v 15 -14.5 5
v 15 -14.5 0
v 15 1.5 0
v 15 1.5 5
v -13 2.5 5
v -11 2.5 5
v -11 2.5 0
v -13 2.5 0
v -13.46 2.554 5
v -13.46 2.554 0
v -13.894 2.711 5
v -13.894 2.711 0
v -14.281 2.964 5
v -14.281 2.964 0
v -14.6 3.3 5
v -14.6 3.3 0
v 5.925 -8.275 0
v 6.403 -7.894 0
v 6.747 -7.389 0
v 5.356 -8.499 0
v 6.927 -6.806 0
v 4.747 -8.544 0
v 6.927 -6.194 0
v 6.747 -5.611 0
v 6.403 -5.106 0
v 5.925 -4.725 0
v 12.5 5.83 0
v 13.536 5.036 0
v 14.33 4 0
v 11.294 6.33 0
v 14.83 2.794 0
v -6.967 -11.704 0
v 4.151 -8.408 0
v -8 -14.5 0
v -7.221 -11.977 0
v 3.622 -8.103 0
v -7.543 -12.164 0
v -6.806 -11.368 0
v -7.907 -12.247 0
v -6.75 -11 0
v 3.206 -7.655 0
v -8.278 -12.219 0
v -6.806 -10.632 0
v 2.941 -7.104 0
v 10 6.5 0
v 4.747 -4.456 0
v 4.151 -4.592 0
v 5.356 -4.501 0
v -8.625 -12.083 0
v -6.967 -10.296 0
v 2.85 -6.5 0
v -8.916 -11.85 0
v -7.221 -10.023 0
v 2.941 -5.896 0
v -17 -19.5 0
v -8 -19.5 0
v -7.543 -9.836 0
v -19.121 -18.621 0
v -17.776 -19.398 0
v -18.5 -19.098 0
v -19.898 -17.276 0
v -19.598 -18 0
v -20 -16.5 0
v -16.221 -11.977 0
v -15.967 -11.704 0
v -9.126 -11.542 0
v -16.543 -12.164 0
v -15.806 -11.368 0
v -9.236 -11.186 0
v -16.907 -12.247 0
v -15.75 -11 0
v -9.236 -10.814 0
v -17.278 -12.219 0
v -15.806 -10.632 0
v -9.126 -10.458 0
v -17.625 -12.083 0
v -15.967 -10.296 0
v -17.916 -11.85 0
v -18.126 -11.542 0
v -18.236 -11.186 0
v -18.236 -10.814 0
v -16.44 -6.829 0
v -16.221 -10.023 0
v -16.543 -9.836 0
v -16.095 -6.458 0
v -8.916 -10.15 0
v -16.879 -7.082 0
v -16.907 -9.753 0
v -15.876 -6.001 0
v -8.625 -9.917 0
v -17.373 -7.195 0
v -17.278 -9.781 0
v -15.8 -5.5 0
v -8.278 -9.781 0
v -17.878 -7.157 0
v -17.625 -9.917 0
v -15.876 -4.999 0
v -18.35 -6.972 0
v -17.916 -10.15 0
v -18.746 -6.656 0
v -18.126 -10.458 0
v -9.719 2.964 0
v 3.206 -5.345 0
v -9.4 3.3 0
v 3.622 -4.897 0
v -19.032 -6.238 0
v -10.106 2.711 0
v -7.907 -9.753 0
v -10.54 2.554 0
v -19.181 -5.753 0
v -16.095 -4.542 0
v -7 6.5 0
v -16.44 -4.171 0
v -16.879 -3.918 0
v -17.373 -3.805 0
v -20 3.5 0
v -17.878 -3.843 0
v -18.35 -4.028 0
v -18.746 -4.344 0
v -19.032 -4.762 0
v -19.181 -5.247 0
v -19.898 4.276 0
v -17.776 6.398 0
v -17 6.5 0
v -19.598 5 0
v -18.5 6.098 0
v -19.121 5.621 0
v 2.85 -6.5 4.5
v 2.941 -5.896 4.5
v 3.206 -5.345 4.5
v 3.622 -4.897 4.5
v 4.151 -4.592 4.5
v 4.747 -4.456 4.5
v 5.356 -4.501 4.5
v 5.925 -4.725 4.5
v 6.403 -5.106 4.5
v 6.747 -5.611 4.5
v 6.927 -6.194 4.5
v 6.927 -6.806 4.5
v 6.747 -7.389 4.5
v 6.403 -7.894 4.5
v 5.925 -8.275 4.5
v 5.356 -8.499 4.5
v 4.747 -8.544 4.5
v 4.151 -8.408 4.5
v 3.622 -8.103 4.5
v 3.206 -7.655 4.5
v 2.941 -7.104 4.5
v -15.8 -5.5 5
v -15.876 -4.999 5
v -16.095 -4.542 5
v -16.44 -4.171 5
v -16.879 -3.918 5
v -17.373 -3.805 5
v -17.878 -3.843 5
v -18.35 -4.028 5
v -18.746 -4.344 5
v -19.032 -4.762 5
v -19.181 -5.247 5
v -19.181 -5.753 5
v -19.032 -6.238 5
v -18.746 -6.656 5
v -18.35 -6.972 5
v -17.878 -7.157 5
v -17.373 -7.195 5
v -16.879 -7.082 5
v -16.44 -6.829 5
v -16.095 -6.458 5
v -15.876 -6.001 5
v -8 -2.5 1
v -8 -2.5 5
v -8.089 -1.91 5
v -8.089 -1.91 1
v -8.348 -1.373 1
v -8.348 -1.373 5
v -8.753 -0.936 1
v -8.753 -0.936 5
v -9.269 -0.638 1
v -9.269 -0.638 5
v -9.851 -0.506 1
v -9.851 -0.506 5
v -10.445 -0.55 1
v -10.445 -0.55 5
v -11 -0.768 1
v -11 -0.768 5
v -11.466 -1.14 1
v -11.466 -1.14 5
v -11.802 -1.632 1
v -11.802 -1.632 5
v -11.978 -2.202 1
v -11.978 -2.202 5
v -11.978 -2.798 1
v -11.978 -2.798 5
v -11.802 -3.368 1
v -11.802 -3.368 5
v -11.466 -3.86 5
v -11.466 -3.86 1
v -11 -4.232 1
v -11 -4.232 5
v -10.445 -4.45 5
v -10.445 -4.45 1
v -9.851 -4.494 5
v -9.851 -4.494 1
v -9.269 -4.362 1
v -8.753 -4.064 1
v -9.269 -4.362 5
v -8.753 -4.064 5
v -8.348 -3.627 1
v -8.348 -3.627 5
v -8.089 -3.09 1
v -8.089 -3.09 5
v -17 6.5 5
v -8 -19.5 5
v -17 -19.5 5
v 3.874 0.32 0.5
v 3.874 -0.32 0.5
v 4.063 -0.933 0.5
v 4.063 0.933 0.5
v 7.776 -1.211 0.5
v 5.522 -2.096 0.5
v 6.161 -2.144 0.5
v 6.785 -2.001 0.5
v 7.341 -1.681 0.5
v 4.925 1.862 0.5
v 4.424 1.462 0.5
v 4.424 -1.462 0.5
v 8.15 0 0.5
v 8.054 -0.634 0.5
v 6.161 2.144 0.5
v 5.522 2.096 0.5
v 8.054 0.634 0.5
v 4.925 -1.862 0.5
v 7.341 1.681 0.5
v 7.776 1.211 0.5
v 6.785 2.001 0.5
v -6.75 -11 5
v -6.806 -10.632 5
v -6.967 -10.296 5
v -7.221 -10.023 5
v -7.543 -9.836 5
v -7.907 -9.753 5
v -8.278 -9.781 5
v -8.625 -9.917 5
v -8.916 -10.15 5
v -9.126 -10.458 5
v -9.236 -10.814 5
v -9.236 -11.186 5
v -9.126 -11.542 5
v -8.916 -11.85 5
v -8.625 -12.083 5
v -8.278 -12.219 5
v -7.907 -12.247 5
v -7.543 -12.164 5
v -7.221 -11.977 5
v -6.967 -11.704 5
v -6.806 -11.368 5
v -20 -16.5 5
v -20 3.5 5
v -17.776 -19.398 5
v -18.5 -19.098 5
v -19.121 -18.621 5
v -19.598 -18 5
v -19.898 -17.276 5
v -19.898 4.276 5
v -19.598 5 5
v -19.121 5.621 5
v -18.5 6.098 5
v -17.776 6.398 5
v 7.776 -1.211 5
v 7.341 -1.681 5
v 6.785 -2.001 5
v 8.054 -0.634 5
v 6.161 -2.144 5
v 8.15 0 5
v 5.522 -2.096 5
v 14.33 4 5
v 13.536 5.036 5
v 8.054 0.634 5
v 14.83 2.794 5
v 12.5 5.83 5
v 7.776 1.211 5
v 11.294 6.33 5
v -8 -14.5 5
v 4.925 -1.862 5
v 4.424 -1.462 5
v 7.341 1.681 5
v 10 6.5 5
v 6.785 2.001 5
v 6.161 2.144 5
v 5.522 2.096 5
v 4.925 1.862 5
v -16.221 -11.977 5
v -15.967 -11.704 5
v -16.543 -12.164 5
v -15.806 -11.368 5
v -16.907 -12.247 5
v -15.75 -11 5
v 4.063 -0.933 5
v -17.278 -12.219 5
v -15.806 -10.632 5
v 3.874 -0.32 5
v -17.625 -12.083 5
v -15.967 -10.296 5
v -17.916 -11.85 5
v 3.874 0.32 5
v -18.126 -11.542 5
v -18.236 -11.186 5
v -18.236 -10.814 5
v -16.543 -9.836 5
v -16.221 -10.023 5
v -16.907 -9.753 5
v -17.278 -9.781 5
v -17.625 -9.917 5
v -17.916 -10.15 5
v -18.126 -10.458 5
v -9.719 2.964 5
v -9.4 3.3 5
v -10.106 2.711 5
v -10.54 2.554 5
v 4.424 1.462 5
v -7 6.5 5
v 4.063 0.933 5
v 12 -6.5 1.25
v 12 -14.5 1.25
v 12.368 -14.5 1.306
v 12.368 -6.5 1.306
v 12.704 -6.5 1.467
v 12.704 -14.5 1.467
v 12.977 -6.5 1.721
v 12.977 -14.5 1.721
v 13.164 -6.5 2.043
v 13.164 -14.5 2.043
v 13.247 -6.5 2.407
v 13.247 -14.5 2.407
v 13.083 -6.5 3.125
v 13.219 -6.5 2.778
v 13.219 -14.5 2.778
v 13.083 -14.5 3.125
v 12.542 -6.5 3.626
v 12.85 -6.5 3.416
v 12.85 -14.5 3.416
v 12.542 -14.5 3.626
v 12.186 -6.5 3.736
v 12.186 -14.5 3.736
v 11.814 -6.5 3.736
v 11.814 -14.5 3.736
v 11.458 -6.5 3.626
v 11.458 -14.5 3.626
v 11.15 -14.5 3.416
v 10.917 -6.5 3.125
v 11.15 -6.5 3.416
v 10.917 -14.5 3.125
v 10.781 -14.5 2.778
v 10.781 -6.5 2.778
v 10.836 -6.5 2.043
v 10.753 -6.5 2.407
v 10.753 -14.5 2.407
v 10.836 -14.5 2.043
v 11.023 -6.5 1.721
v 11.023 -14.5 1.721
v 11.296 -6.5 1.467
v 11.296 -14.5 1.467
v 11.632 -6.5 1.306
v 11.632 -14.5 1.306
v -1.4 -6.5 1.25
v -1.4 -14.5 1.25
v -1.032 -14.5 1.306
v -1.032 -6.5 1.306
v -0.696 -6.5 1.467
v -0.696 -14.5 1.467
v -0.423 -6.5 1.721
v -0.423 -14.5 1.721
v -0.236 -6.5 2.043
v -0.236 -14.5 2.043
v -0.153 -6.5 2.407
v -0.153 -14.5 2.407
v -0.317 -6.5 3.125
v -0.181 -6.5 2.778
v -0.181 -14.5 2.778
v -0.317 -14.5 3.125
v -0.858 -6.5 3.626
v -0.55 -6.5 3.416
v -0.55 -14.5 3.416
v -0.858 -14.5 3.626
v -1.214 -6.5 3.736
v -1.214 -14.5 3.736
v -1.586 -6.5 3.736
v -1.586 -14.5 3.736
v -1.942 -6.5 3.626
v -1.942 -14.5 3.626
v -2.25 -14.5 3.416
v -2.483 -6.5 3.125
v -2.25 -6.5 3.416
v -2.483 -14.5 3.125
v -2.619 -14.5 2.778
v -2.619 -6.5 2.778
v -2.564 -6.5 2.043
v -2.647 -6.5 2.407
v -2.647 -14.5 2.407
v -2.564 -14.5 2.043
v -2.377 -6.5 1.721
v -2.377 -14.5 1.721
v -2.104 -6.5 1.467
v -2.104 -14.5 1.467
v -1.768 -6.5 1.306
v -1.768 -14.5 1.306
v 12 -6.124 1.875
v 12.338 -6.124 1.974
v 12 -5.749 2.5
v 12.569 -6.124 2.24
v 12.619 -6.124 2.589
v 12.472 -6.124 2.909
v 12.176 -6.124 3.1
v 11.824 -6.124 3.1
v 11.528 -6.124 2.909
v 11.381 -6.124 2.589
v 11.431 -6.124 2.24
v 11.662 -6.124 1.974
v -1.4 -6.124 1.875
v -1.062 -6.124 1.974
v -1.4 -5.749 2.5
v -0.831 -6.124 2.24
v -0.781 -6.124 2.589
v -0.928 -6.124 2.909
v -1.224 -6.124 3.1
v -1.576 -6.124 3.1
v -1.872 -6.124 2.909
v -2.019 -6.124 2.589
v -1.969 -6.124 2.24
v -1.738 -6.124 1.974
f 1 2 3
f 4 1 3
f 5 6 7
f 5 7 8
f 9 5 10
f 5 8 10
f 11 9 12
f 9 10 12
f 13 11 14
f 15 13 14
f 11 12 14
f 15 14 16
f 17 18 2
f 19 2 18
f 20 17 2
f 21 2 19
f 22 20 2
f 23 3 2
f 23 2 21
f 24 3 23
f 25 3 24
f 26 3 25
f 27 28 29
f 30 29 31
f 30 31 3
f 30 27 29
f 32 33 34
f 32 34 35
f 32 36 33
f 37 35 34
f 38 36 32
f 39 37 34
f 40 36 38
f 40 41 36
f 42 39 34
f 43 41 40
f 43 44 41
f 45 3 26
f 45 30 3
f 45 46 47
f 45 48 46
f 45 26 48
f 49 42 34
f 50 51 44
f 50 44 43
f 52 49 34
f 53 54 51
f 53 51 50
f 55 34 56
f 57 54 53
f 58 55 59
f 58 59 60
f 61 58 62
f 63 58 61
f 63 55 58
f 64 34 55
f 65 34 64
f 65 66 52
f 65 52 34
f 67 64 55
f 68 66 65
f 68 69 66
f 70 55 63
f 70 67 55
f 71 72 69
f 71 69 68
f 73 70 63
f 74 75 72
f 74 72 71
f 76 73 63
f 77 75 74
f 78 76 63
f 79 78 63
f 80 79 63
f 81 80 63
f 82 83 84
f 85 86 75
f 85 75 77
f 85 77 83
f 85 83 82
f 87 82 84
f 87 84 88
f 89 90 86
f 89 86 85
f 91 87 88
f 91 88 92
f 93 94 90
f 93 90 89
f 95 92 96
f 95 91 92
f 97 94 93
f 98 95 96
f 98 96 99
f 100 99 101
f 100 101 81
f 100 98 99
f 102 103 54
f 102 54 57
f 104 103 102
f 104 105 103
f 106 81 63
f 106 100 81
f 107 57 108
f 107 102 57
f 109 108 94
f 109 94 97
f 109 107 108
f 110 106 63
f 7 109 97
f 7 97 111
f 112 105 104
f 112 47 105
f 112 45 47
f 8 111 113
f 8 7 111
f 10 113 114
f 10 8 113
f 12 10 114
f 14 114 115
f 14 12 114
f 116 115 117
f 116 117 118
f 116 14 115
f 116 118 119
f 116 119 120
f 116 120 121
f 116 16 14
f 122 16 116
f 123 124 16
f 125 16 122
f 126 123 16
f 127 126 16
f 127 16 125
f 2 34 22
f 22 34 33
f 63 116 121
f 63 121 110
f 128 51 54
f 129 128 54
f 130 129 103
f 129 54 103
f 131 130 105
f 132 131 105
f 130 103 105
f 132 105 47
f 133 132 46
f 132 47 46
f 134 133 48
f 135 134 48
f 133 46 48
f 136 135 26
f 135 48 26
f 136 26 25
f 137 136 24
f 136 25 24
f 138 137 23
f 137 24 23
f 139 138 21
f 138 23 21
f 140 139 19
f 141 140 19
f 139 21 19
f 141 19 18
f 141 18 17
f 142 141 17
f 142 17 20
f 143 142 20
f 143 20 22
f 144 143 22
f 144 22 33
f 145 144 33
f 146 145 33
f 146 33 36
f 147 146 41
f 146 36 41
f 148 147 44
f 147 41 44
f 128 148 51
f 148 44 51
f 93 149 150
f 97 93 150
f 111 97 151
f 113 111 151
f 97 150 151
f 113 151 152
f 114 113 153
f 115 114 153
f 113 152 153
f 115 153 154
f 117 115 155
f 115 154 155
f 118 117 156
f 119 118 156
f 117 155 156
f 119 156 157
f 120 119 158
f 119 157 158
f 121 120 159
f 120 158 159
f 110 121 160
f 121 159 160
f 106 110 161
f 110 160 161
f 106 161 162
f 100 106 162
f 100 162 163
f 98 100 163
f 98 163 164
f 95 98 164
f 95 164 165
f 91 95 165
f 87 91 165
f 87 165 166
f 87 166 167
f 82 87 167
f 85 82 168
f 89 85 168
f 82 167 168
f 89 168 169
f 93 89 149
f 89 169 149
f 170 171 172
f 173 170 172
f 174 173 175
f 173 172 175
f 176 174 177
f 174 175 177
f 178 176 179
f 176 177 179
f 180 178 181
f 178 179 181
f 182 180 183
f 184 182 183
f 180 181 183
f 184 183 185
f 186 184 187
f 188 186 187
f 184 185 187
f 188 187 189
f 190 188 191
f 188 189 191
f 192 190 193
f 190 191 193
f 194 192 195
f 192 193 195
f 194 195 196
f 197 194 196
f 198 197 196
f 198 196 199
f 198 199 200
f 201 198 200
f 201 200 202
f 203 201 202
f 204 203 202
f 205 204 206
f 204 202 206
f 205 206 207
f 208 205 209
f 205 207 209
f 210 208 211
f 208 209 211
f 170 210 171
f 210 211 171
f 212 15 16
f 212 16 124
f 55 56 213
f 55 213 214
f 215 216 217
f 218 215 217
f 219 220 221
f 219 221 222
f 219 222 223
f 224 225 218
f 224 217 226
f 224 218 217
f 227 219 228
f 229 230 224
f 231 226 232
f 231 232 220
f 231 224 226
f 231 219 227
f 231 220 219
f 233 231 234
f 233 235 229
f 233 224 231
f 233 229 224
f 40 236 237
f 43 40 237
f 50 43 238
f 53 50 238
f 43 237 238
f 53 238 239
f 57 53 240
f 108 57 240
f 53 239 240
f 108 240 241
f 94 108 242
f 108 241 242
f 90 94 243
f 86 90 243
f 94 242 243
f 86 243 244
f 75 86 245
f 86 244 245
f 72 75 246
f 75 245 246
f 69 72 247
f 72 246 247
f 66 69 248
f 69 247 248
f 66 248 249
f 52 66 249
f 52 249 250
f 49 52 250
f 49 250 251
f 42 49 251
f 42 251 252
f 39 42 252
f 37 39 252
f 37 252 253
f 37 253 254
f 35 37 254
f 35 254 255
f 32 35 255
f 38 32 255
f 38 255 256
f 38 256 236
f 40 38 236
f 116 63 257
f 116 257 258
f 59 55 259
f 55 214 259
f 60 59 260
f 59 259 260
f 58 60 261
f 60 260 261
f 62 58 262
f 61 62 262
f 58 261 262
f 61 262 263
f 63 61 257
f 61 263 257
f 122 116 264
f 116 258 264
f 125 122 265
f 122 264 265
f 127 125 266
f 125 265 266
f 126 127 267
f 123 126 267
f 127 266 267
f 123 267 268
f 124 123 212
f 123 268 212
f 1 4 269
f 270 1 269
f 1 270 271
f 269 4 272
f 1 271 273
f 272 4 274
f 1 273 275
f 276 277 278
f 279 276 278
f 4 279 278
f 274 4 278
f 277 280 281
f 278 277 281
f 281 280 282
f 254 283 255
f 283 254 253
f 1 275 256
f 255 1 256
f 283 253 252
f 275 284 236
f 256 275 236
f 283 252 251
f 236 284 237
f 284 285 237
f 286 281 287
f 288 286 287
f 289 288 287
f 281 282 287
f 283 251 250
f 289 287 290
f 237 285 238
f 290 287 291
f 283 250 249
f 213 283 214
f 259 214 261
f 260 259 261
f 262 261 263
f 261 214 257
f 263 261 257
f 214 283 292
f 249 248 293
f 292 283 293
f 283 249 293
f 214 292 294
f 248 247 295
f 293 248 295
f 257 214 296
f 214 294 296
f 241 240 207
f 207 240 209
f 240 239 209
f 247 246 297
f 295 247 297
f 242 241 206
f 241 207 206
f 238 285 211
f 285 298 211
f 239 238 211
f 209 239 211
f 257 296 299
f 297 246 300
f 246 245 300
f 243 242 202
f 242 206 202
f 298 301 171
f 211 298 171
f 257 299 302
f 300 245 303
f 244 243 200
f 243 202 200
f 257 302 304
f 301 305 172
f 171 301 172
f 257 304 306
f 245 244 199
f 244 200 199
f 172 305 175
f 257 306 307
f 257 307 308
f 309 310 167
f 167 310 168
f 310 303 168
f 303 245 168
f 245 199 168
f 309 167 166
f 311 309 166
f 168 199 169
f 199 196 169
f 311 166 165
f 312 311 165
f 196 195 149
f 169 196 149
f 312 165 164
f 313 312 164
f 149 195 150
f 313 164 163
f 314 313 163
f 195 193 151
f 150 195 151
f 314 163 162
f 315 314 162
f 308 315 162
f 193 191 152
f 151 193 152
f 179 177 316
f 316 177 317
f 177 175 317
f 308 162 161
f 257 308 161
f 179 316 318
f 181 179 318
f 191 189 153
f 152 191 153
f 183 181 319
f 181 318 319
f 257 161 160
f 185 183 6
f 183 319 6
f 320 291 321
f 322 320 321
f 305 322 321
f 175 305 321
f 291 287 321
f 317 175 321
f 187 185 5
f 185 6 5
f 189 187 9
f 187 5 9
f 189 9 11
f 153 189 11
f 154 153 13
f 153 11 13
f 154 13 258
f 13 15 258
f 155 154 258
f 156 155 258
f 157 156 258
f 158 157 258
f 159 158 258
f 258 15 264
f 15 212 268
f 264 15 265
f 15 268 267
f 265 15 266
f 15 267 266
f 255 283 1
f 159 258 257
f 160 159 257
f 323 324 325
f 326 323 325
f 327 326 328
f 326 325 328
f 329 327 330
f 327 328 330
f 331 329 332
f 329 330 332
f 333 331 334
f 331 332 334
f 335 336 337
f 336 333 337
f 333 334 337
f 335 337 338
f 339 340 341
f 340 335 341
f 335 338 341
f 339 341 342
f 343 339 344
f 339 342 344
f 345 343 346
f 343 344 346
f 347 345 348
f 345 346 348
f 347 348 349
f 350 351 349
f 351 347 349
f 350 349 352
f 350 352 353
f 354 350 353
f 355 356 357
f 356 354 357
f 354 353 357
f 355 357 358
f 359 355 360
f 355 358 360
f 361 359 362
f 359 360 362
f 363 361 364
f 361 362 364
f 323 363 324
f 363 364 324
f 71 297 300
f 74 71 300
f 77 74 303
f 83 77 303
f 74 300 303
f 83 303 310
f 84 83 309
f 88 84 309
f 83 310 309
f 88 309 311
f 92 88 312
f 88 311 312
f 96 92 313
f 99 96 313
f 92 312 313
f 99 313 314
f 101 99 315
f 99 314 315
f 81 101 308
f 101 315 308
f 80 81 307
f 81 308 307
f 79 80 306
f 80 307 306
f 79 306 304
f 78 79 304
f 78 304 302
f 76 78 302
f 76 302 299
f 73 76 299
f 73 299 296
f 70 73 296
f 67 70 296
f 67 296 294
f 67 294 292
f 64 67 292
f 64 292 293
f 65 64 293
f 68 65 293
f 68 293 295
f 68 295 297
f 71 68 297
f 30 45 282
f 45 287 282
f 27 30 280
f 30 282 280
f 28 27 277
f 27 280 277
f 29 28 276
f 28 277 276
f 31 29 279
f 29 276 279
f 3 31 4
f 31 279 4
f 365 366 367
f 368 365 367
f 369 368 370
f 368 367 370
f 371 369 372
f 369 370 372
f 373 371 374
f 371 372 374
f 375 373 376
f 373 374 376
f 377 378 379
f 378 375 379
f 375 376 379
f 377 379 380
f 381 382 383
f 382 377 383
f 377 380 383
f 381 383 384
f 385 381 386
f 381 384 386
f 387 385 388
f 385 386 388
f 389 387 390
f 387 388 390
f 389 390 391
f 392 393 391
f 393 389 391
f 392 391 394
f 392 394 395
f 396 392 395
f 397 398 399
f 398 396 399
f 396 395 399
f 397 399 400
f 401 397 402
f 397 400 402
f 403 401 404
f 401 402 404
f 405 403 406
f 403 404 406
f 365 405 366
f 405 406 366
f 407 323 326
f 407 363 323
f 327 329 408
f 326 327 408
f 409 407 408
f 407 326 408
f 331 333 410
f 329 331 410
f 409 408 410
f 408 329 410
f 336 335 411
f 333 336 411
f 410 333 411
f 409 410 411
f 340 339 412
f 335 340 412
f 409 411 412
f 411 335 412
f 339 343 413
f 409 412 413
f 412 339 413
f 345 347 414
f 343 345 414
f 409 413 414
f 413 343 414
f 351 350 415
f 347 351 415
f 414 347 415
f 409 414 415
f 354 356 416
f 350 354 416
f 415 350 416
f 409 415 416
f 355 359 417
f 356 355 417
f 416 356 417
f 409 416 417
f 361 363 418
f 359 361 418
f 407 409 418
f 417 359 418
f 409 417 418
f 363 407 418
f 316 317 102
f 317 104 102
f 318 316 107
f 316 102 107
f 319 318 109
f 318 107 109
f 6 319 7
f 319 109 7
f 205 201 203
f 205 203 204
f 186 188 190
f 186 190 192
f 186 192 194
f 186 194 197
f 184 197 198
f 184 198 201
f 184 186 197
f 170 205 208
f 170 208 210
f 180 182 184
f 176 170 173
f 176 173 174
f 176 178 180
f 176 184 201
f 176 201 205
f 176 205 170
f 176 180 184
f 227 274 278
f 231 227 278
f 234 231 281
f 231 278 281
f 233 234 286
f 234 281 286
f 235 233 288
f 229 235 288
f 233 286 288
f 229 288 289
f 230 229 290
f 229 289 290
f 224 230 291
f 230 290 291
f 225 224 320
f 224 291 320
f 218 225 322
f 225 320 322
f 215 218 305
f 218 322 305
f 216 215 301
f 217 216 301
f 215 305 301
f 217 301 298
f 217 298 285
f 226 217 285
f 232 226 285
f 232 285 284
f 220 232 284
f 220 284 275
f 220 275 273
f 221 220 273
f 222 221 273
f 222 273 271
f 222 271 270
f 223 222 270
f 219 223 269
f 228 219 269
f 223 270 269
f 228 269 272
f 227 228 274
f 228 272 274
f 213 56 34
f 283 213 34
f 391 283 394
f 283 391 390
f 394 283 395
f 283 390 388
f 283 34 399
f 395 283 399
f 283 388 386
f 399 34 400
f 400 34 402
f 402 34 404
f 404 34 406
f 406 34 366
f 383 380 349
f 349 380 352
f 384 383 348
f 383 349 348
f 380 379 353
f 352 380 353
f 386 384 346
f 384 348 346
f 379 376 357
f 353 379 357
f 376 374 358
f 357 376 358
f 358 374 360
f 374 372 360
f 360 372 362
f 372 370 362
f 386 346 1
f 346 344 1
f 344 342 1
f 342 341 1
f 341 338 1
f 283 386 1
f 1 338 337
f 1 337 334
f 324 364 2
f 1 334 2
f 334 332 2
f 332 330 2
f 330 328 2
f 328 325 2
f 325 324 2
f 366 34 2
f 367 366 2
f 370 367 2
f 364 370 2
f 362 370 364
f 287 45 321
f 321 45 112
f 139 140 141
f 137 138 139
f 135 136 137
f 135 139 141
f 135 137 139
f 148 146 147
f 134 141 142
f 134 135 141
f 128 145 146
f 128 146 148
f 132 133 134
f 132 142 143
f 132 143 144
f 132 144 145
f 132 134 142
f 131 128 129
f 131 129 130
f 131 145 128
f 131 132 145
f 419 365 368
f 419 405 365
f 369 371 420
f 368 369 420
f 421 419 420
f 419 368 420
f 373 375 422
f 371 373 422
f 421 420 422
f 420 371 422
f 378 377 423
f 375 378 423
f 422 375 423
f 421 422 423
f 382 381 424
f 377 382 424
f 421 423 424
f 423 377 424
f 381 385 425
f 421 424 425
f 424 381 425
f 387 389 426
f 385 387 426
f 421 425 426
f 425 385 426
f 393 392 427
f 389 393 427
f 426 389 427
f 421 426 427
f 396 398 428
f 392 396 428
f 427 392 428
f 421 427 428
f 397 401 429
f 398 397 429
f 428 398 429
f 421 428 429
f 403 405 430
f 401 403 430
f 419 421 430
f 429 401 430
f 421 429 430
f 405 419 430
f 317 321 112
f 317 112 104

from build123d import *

# Parameters (mm, degrees)
SKETCH1_W             = 23
SKETCH1_H             = 21
EXTRUDE1_DEPTH        = 5
SKETCH2_R             = 2.15
EXTRUDE2_DEPTH        = 4.5
SKETCH4_R             = 1.25
EXTRUDE4_DEPTH        = 8
FILLET1_R             = 5
SKETCH6_R             = 2.05
EXTRUDE6_DEPTH        = 4.5
SKETCH9_W             = 12
SKETCH9_H             = 26
EXTRUDE9_DEPTH        = 5
SKETCH11_R            = 1.7
EXTRUDE11_DEPTH       = 5
SKETCH10_R            = 2
EXTRUDE10_DEPTH       = 4
M3_TAPPED_HOLE1_D     = 2.5
M3_TAPPED_HOLE1_DEPTH = 8
M3_TAPPED_HOLE1_TIP   = 0.751075774
FILLET3_R             = 3
EXTRUDE15_DEPTH       = 5
FILLET6_R             = 2
SKETCH16_R            = 0.75
EXTRUDE16_DEPTH       = 5
M3_TAPPED_HOLE2_D     = 2.5
M3_TAPPED_HOLE2_DEPTH = 7.5
M3_TAPPED_HOLE2_TIP   = 0.751075774


with BuildPart() as part:
    # Sketch1 → Extrude1 (new body)
    with BuildSketch(Plane.XY):
        with Locations((3.5, -4)):
            Rectangle(SKETCH1_W, SKETCH1_H)
    extrude(amount=EXTRUDE1_DEPTH)

    # Sketch2 → Extrude2 (cut)
    with BuildSketch(Plane.XY.offset(5)):
        with Locations((6, 0)):
            Circle(SKETCH2_R)
    extrude(amount=-EXTRUDE2_DEPTH, mode=Mode.SUBTRACT)

    # Sketch4 → Extrude4 (cut)
    with BuildSketch(Plane.XZ.offset(14.5)):
        with Locations(Location((-1.4, 2.5, 0), (0, 0, 270))):
            Circle(SKETCH4_R)
        with Locations(Location((12, 2.5, 0), (0, 0, 270))):
            Circle(SKETCH4_R)
    extrude(amount=-EXTRUDE4_DEPTH, mode=Mode.SUBTRACT)

    # Fillet1
    fillet1_edges = [part.edges().sort_by_distance(p)[0] for p in [
        (15, 6.5, 2.5),
    ]]
    fillet(fillet1_edges, radius=FILLET1_R)

    # Sketch6 → Extrude6 (cut)
    with BuildSketch(Plane(origin=(0, 0, 0), x_dir=(-1, 0, 0), z_dir=(0, 0, -1))):
        with Locations((-4.9, -6.5)):
            Circle(SKETCH6_R)
    extrude(amount=-EXTRUDE6_DEPTH, mode=Mode.SUBTRACT)

    # Sketch9 → Extrude9 (add)
    with BuildSketch(Plane(origin=(0, 0, 0), x_dir=(-1, 0, 0), z_dir=(0, 0, -1))):
        with Locations((14, -6.5)):
            Rectangle(SKETCH9_W, SKETCH9_H)
    extrude(amount=-EXTRUDE9_DEPTH)

    # Sketch11 → Extrude11 (cut)
    with BuildSketch(Plane.XY.offset(5)):
        with Locations((-17.5, -5.5)):
            Circle(SKETCH11_R)
    extrude(amount=-EXTRUDE11_DEPTH, mode=Mode.SUBTRACT)

    # Sketch10 → Extrude10 (cut)
    with BuildSketch(Plane.XY.offset(5)):
        with Locations((-10, -2.5)):
            Circle(SKETCH10_R)
    extrude(amount=-EXTRUDE10_DEPTH, mode=Mode.SUBTRACT)

    # M3 Tapped Hole1
    with Locations(Plane(origin=(-1.4, -14.5, 2.5), x_dir=(0, 0, -1), z_dir=(0, -1, 0))):
        with Locations((0, 0), (0, 13.4)):
            Hole(M3_TAPPED_HOLE1_D / 2, depth=M3_TAPPED_HOLE1_DEPTH)
            with Locations((0, 0, -(M3_TAPPED_HOLE1_DEPTH + M3_TAPPED_HOLE1_TIP / 2))):  # 118° drill point
                Cone(0, M3_TAPPED_HOLE1_D / 2, M3_TAPPED_HOLE1_TIP, mode=Mode.SUBTRACT)

    # Fillet3
    fillet3_edges = [part.edges().sort_by_distance(p)[0] for p in [
        (-20, -19.5, 2.5),
        (-20, 6.5, 2.5),
    ]]
    fillet(fillet3_edges, radius=FILLET3_R)

    # Sketch15 → Extrude15 (cut)
    with BuildSketch(Plane.XY.offset(5)):
        Polygon((-14, 2.5), (-17, 6.5), (-7, 6.5), (-10, 2.5), align=None)
    extrude(amount=-EXTRUDE15_DEPTH, mode=Mode.SUBTRACT)

    # Fillet6
    fillet6_edges = [part.edges().sort_by_distance(p)[0] for p in [
        (-10, 2.5, 2.5),
        (-14, 2.5, 2.5),
    ]]
    fillet(fillet6_edges, radius=FILLET6_R)

    # Sketch16 → Extrude16 (cut)
    with BuildSketch(Plane(origin=(0, 0, 0), x_dir=(-1, 0, 0), z_dir=(0, 0, -1))):
        with Locations((17, -11)):
            Circle(SKETCH16_R)
        with Locations((8, -11)):
            Circle(SKETCH16_R)
    extrude(amount=-EXTRUDE16_DEPTH, mode=Mode.SUBTRACT)

    # M3 Tapped Hole2
    with Locations(Plane(origin=(-8, -11, 0), x_dir=(-1, 0, 0), z_dir=(0, 0, -1))):
        with Locations((0, 0), (9, 0)):
            Hole(M3_TAPPED_HOLE2_D / 2, depth=M3_TAPPED_HOLE2_DEPTH)
            with Locations((0, 0, -(M3_TAPPED_HOLE2_DEPTH + M3_TAPPED_HOLE2_TIP / 2))):  # 118° drill point
                Cone(0, M3_TAPPED_HOLE2_D / 2, M3_TAPPED_HOLE2_TIP, mode=Mode.SUBTRACT)


solid = part.part
